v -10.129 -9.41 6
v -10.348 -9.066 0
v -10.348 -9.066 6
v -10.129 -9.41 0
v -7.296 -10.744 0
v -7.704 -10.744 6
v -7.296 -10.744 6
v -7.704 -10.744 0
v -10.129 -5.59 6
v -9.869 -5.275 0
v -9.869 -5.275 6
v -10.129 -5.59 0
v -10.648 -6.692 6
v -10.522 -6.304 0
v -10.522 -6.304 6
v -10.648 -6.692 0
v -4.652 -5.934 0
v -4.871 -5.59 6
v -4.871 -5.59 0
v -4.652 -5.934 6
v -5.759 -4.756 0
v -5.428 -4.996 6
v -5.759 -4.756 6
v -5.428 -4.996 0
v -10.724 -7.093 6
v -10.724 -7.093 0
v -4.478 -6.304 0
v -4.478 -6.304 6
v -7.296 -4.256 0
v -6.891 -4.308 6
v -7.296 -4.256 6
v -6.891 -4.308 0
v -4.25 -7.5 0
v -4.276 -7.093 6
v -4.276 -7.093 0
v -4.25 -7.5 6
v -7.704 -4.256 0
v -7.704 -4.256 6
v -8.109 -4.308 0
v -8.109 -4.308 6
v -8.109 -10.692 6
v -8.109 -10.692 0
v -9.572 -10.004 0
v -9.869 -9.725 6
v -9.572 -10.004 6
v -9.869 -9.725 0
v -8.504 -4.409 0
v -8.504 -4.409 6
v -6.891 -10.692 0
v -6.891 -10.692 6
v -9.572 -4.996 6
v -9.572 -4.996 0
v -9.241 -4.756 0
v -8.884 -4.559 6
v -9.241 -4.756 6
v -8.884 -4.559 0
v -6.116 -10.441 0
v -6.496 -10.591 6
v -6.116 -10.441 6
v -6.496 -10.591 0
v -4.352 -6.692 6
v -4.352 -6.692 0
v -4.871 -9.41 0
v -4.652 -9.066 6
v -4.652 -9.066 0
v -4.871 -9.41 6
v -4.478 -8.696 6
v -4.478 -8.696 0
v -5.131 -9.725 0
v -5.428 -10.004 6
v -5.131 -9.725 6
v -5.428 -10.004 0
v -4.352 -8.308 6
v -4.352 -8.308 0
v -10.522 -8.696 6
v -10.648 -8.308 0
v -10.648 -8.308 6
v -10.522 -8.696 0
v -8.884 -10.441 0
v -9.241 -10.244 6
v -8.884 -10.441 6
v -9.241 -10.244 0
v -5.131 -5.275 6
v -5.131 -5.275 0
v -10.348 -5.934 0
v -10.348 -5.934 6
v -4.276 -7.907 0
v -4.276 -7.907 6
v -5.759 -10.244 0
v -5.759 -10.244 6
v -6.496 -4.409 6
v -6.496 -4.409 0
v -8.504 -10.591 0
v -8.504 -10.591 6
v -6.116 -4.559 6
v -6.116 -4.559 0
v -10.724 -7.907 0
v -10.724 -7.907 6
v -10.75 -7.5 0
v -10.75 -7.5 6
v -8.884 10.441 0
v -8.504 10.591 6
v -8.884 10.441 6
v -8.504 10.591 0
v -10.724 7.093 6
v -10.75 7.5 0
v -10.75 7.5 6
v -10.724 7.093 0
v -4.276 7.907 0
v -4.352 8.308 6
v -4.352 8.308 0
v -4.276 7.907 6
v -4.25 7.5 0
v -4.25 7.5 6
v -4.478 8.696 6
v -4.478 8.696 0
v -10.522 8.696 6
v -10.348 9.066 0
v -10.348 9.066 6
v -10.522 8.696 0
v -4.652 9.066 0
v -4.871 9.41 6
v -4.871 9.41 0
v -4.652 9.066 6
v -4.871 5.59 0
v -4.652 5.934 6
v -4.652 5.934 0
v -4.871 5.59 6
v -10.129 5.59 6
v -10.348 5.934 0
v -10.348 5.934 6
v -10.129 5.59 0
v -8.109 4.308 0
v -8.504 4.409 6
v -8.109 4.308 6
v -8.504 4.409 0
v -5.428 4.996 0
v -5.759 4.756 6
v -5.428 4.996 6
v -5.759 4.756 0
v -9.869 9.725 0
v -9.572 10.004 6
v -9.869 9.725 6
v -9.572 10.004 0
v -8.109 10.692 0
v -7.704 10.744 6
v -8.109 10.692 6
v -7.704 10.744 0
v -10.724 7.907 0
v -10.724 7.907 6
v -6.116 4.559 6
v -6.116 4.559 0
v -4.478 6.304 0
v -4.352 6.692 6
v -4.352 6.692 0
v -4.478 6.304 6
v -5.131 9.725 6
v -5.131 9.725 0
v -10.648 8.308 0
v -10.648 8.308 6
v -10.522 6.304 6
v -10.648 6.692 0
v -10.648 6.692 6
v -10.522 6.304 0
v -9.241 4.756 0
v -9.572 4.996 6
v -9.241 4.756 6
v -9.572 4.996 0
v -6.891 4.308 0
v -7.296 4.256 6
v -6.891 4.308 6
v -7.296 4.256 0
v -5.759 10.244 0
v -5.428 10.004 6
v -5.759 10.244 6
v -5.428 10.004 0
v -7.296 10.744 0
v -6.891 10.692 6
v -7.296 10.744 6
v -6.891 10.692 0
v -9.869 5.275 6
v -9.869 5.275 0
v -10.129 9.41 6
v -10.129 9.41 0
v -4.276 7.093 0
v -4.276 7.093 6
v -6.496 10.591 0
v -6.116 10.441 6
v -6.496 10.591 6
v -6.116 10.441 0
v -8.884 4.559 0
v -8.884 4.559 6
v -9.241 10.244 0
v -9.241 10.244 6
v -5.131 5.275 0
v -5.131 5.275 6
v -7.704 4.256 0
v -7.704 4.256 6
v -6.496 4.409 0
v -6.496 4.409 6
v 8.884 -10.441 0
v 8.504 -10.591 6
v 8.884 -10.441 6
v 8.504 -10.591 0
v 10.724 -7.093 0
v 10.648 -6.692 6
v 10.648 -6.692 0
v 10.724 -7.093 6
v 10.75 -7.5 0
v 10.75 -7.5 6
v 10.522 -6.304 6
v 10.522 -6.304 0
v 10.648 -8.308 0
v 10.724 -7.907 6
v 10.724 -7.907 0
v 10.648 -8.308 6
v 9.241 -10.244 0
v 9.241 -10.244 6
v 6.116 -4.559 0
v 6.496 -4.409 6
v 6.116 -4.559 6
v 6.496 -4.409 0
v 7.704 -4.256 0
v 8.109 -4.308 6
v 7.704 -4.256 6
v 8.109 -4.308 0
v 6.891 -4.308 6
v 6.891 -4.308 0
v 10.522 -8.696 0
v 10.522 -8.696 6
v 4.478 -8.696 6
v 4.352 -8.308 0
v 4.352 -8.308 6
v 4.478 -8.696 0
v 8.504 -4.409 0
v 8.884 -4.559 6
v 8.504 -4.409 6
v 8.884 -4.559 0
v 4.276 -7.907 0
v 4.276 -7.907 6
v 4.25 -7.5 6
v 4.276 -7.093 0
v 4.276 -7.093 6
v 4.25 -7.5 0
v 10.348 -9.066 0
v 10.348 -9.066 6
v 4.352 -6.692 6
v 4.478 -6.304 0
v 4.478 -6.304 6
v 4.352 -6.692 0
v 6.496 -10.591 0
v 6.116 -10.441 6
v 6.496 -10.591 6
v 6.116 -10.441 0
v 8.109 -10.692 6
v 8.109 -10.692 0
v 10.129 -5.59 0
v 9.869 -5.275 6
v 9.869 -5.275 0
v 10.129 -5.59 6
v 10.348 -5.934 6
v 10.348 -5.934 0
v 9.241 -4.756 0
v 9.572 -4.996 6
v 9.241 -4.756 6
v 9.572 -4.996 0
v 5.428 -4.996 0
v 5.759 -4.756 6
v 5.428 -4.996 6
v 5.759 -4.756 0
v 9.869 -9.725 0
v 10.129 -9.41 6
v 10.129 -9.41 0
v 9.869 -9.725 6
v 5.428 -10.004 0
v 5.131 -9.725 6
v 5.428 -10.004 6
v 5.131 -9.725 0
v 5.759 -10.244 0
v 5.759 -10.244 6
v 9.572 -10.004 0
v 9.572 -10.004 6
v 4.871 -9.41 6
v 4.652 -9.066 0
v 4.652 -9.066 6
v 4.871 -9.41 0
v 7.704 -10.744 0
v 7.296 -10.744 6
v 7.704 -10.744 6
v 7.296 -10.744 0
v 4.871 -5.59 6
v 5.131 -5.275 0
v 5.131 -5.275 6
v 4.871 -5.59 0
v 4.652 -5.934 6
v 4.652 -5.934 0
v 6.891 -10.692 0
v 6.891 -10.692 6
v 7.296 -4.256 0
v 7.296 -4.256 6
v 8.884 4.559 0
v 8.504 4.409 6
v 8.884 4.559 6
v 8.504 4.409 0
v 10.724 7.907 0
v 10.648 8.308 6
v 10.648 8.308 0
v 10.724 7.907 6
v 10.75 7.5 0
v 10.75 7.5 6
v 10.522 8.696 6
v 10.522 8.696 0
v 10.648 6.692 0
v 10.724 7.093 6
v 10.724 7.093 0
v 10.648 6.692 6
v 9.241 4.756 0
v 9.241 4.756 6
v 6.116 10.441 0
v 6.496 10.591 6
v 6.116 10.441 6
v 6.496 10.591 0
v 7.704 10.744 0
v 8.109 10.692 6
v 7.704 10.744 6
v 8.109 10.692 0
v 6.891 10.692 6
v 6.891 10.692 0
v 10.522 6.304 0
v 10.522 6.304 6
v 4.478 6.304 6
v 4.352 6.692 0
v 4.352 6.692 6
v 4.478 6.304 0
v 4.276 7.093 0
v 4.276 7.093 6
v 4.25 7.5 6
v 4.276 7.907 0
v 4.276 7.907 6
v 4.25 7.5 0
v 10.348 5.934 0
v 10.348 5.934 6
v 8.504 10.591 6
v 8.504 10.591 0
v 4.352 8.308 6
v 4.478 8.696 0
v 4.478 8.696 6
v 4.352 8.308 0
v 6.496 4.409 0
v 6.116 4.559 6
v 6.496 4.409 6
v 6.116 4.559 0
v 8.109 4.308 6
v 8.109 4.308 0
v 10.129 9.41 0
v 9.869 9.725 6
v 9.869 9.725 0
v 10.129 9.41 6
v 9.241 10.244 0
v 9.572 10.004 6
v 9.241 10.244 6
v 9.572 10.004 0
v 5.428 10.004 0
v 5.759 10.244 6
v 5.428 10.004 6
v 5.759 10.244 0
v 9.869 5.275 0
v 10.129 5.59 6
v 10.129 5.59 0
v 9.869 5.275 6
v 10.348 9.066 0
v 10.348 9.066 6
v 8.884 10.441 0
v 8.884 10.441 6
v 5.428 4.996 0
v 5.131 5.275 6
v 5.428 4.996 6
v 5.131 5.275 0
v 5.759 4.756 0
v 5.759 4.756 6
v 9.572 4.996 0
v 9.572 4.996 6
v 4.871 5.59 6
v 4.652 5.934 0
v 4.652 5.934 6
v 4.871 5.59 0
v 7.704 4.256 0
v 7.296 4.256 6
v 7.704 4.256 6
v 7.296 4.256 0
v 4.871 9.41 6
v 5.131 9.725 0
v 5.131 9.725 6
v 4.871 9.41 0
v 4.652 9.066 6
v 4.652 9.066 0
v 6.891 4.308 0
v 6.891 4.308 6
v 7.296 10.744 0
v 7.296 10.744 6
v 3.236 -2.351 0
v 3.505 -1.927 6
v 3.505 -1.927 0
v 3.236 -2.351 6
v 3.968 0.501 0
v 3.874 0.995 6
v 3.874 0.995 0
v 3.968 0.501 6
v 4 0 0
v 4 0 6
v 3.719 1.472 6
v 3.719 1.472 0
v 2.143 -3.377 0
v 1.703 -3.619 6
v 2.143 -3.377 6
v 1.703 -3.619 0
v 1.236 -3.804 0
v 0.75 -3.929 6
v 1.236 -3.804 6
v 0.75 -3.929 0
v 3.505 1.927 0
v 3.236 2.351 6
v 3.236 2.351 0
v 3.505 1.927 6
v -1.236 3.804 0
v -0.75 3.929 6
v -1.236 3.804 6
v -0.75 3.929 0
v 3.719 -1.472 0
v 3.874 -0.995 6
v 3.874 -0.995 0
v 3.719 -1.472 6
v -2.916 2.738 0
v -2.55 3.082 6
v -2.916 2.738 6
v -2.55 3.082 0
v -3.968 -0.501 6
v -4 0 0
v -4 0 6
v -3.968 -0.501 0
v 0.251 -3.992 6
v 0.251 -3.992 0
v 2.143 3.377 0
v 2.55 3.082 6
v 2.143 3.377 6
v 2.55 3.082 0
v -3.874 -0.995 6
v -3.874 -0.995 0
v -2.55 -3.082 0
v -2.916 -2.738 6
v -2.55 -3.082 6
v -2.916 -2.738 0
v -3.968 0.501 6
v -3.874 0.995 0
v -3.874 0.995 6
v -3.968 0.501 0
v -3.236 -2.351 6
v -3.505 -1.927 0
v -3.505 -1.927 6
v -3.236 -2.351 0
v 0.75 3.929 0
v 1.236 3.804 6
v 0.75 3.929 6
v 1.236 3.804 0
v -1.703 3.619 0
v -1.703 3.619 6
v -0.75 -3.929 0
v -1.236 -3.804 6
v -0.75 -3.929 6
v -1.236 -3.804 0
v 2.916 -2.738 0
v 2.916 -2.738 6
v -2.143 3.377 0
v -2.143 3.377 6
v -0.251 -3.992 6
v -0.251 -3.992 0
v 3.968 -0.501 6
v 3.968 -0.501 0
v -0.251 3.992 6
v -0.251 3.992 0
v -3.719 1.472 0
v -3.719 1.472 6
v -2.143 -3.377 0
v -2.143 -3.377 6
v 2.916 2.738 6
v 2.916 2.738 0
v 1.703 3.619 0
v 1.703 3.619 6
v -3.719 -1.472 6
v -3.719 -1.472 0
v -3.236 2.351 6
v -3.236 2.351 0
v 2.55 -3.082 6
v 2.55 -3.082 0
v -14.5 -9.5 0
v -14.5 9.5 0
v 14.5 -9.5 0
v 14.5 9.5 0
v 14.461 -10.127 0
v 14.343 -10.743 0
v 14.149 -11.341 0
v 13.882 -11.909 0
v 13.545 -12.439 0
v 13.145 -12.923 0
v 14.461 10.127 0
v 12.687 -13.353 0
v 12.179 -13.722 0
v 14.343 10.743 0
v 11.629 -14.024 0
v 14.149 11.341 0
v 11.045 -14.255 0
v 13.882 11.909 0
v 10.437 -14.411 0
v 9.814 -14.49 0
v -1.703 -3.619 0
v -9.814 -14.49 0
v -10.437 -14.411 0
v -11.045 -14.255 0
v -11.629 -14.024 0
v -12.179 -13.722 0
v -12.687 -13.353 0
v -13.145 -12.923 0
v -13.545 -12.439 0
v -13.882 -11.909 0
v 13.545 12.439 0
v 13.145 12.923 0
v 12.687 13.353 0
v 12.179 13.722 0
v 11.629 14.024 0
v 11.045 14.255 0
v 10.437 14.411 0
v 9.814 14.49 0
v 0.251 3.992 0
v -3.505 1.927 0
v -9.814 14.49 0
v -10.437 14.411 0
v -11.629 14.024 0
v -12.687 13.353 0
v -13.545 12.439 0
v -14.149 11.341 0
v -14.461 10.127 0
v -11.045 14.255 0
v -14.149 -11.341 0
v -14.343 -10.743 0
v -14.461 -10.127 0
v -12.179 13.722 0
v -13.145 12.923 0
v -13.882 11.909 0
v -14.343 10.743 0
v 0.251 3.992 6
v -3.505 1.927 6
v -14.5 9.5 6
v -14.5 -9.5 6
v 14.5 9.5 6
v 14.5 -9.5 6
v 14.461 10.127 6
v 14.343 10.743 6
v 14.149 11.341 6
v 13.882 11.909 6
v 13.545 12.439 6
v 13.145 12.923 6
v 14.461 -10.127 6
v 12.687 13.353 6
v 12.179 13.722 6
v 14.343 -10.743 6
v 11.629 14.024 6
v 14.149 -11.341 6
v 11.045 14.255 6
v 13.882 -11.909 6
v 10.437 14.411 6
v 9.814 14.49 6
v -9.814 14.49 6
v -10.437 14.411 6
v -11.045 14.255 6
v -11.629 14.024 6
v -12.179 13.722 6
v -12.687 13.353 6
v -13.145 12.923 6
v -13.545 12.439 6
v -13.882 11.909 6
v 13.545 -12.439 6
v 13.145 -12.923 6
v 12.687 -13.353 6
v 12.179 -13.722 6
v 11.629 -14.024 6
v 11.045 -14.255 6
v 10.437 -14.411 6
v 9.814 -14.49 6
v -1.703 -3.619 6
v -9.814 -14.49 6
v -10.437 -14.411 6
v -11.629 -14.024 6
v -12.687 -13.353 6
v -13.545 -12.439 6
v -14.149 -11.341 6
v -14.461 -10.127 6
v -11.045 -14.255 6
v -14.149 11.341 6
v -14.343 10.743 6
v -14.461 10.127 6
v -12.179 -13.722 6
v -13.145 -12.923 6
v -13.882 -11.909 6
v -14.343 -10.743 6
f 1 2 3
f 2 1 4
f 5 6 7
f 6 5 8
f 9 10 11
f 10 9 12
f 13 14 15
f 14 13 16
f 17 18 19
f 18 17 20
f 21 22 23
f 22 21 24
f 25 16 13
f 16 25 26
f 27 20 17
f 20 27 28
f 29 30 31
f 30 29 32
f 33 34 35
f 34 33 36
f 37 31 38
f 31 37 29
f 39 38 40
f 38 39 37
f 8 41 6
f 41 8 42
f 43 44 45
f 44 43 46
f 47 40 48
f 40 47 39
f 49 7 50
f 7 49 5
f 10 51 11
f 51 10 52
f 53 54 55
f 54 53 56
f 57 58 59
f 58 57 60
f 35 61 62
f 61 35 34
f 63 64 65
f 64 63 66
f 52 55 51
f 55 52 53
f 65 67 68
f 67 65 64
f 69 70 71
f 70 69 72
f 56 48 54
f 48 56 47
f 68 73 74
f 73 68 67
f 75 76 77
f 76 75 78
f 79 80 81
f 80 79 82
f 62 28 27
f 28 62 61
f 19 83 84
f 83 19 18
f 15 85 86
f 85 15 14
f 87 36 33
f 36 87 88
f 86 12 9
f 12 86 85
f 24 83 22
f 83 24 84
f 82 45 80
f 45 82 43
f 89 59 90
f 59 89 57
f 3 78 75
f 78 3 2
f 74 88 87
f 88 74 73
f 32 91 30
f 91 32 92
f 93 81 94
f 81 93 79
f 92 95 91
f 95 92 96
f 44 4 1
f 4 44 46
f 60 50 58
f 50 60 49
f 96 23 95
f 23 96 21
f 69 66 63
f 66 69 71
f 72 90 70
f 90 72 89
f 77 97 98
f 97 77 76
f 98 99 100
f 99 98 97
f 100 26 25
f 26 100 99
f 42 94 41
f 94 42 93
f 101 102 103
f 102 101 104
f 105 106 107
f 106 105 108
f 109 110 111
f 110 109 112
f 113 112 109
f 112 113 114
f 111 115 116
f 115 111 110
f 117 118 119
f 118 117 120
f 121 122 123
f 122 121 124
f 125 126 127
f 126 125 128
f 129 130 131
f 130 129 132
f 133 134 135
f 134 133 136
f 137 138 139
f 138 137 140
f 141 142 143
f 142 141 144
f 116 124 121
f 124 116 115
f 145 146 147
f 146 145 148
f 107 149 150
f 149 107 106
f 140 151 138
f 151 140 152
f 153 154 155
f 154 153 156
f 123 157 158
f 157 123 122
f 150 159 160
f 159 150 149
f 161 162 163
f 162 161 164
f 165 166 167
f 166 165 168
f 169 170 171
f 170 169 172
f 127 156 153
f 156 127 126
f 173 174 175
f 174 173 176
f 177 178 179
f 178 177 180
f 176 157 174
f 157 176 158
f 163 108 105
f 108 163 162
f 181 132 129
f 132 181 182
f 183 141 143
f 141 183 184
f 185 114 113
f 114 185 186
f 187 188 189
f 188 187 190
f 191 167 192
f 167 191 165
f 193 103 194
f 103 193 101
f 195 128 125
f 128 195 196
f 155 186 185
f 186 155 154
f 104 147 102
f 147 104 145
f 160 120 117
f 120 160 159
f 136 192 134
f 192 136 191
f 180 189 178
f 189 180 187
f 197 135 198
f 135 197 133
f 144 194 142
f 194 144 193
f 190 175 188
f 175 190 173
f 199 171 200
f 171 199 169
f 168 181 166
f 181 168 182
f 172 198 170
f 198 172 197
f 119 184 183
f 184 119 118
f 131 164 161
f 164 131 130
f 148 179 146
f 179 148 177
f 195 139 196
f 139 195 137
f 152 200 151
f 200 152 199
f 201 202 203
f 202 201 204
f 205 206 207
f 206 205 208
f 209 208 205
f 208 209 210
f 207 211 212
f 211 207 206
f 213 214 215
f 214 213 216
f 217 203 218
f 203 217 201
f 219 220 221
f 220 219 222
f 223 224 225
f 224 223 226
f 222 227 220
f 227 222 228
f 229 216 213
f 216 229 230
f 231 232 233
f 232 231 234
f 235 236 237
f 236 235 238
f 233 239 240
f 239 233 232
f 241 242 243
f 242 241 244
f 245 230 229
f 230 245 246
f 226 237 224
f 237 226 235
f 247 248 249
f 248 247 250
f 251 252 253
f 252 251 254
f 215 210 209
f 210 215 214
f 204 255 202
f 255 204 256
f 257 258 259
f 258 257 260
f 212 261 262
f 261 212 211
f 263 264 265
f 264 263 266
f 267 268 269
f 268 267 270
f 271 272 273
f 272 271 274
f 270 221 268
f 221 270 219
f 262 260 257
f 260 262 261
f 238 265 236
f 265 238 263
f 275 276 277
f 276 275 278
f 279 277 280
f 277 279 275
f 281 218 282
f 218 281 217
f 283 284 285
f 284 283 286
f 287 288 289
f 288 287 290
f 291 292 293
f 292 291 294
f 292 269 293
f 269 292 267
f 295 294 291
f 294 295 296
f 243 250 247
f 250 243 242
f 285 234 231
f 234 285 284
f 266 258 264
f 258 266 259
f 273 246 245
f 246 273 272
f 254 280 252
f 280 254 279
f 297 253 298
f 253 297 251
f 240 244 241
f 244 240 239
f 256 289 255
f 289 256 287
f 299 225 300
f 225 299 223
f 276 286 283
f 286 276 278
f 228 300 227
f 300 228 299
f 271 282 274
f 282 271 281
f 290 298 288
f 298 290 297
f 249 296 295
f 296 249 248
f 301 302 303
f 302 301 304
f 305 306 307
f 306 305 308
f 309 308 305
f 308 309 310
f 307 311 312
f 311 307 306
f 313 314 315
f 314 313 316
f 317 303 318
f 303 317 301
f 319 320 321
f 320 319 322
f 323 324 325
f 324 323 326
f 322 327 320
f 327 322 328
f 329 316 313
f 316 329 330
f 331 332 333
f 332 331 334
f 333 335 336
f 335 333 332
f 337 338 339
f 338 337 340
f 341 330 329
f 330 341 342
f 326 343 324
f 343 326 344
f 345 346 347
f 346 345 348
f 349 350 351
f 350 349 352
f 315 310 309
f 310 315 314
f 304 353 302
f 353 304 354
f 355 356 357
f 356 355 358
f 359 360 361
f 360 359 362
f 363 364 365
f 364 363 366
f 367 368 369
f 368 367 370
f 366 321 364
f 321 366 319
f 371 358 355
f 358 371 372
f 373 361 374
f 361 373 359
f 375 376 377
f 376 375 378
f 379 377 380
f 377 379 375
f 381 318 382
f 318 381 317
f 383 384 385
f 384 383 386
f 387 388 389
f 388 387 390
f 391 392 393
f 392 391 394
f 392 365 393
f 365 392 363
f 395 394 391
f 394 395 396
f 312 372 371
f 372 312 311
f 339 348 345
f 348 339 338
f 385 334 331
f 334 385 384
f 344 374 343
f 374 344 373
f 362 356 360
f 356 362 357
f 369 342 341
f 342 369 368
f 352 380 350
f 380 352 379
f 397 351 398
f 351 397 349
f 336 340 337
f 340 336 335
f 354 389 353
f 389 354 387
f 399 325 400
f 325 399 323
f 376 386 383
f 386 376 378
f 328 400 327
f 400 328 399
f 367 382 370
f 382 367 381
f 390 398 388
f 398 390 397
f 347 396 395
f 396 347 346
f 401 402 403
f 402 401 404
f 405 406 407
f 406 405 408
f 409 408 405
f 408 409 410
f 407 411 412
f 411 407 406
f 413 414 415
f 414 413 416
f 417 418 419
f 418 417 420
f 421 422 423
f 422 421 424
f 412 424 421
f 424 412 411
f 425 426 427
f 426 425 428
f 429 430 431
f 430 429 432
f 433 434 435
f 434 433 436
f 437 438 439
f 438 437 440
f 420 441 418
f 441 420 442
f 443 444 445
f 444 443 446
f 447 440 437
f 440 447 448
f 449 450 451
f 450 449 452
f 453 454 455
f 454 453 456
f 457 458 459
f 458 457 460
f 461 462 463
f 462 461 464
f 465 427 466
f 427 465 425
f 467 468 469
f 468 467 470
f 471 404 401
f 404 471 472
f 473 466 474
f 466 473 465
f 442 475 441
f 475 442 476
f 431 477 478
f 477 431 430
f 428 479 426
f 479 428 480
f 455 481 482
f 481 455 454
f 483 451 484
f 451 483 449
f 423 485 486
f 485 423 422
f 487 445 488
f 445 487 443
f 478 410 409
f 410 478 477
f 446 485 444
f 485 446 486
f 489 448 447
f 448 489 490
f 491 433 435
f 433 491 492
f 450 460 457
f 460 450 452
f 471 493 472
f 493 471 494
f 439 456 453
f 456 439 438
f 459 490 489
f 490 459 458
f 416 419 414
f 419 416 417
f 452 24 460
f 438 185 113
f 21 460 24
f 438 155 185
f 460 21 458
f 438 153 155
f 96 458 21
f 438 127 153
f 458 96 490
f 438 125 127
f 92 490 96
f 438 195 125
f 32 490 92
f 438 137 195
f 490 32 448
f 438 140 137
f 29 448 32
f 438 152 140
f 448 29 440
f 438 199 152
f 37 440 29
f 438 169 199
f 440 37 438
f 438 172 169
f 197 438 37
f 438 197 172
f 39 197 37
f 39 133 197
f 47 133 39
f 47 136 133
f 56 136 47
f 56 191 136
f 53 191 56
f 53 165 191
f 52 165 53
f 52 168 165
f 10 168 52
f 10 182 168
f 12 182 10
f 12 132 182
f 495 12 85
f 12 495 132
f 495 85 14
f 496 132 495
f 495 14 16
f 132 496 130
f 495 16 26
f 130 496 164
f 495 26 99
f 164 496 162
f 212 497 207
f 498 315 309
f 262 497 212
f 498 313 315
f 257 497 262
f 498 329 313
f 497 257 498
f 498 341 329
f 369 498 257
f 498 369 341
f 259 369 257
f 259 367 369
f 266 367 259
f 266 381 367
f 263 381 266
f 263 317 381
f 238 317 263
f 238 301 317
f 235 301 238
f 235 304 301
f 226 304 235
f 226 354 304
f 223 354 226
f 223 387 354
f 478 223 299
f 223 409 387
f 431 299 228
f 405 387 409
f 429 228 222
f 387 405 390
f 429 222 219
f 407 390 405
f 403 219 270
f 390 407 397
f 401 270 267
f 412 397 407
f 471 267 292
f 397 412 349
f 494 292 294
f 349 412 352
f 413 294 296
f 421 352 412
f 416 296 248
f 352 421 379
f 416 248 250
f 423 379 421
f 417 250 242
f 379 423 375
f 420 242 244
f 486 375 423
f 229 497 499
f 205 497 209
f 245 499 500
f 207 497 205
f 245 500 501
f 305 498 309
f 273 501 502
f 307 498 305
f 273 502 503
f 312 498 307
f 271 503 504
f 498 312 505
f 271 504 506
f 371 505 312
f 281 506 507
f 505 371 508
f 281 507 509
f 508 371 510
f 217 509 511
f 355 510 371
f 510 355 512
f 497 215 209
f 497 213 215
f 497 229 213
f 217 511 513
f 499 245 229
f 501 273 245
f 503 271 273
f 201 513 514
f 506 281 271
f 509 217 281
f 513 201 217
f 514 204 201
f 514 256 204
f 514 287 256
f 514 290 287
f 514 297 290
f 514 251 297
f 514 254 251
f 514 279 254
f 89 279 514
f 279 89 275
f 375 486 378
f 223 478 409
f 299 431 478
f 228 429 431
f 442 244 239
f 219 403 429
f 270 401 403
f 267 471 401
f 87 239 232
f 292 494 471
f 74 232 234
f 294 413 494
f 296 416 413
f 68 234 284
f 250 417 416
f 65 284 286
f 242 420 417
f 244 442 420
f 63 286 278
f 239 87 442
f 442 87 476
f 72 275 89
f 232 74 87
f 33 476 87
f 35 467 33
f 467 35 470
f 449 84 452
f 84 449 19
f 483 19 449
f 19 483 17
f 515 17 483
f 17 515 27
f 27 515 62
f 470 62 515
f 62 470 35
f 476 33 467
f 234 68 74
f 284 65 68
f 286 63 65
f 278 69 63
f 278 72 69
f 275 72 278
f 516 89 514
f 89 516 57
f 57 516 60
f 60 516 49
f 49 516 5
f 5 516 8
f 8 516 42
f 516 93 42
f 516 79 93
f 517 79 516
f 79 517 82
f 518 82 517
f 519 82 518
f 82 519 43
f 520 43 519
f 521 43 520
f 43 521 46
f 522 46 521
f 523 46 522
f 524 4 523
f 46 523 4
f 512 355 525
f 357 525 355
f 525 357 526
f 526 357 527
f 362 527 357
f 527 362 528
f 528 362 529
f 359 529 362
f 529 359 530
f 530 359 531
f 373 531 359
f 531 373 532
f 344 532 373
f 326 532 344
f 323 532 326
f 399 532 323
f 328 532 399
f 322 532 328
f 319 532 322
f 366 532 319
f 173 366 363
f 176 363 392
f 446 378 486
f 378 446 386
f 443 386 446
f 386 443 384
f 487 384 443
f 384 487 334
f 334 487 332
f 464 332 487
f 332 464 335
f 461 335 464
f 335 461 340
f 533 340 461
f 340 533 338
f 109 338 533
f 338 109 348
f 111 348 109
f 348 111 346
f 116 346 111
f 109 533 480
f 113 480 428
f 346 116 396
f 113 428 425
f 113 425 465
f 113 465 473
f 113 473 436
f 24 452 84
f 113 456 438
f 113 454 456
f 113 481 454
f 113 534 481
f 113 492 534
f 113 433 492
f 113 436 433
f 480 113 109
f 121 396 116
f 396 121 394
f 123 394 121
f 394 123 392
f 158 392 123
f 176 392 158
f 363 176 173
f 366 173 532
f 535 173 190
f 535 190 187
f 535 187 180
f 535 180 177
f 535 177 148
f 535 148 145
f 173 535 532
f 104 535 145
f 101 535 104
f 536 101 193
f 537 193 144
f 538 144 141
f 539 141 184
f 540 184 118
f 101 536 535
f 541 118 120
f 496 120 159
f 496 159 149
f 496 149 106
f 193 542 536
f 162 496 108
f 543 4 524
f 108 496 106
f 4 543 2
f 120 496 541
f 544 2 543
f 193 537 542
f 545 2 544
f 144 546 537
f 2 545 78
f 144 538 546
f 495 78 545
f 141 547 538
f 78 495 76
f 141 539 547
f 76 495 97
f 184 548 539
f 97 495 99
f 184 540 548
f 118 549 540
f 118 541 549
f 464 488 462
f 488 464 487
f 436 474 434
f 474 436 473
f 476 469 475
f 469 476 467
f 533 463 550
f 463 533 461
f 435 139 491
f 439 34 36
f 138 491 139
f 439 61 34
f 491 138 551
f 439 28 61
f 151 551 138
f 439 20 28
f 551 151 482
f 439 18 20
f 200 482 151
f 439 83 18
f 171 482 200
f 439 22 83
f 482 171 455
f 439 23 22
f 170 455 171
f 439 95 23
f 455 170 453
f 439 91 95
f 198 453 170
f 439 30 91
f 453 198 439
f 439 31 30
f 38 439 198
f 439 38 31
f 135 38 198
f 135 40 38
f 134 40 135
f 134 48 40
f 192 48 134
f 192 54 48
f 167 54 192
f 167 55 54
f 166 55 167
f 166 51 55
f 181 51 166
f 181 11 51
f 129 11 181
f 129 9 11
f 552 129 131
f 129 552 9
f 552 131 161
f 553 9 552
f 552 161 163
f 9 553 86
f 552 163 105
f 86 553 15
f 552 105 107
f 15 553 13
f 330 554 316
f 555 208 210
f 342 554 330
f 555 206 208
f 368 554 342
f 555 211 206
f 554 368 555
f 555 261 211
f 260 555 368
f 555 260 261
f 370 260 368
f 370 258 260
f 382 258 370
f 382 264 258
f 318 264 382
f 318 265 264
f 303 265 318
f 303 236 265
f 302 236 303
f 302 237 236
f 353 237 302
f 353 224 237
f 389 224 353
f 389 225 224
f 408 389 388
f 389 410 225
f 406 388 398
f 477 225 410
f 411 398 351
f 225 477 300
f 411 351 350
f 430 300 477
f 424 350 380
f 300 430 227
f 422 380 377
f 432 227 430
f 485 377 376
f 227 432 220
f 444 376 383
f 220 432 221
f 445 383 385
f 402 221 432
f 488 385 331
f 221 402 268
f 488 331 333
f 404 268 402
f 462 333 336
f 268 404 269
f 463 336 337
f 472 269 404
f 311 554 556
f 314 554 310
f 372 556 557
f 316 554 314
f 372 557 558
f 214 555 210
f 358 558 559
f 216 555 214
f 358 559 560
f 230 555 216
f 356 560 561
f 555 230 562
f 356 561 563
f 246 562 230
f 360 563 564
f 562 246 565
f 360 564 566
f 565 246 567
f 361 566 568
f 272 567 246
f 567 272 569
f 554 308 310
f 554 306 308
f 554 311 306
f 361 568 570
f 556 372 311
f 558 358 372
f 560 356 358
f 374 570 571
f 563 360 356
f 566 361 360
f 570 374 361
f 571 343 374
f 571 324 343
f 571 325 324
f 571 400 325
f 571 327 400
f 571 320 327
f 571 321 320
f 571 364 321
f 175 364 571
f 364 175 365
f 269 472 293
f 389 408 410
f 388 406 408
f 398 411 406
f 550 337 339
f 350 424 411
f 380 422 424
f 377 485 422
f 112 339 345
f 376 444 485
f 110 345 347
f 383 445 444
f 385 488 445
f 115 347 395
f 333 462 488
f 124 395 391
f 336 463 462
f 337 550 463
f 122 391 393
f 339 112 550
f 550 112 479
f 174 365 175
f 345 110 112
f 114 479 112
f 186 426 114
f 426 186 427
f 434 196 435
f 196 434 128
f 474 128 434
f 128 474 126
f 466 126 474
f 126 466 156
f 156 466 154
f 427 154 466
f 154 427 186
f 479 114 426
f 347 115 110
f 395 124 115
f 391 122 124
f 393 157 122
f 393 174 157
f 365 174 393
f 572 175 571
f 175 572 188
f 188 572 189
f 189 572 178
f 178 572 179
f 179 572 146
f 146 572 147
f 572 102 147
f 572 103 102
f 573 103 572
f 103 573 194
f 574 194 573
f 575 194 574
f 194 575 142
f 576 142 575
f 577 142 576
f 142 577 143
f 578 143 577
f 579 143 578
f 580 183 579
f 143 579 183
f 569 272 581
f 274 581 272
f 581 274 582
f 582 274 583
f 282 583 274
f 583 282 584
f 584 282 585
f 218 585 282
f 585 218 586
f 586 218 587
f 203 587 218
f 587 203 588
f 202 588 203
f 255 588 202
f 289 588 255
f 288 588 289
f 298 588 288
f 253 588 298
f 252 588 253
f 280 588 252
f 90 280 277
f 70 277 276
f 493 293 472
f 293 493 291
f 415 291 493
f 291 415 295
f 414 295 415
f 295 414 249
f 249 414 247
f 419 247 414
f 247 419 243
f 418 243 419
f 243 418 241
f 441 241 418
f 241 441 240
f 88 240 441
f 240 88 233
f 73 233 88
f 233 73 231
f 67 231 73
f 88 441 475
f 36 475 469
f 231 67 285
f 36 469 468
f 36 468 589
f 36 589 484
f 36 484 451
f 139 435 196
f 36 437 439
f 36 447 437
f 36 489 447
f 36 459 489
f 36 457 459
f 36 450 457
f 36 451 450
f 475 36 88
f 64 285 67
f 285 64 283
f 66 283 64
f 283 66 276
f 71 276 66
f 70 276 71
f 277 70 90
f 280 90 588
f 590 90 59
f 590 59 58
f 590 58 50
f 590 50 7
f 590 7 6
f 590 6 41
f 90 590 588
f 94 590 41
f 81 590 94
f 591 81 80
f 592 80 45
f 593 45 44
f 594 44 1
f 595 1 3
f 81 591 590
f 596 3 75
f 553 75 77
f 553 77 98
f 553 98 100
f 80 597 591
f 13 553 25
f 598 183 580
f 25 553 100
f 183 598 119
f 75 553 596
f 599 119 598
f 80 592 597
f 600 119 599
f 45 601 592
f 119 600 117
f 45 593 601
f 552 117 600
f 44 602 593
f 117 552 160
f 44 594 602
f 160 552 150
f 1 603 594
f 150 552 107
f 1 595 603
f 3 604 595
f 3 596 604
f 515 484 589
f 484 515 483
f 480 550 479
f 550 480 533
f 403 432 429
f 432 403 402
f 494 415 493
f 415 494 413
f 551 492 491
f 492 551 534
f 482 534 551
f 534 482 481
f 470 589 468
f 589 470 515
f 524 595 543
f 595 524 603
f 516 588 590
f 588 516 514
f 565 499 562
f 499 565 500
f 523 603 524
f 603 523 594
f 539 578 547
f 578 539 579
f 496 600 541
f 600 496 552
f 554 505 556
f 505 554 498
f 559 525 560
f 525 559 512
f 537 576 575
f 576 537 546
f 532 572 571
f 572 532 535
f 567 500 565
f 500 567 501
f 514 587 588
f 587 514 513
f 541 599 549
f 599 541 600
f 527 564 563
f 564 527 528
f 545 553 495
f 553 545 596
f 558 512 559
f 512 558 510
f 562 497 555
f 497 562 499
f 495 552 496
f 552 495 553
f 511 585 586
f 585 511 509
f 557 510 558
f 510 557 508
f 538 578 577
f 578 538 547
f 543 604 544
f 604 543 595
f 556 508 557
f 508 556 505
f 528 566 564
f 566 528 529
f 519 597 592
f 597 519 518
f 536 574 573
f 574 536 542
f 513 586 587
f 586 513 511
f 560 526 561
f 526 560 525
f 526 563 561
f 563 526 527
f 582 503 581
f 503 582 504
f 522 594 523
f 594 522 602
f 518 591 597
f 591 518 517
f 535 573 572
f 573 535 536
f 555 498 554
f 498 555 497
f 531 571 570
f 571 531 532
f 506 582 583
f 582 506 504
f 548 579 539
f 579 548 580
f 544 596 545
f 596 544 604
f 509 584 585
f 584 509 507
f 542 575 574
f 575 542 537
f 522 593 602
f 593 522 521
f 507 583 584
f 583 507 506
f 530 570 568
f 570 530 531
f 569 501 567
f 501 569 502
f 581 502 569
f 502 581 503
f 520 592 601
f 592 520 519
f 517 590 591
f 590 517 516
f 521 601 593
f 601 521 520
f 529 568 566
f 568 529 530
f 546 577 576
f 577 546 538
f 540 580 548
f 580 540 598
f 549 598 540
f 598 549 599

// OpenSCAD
$fn = 50;


difference() {
	union() {
		hull() {
			translate(v = [-9.5000000000, 9.5000000000, 0]) {
				cylinder(h = 6, r = 5);
			}
			translate(v = [9.5000000000, 9.5000000000, 0]) {
				cylinder(h = 6, r = 5);
			}
			translate(v = [-9.5000000000, -9.5000000000, 0]) {
				cylinder(h = 6, r = 5);
			}
			translate(v = [9.5000000000, -9.5000000000, 0]) {
				cylinder(h = 6, r = 5);
			}
		}
	}
	union() {
		#translate(v = [-7.5000000000, -7.5000000000, -100.0000000000]) {
			cylinder(h = 200, r = 3.2500000000);
		}
		#translate(v = [-7.5000000000, 7.5000000000, -100.0000000000]) {
			cylinder(h = 200, r = 3.2500000000);
		}
		#translate(v = [7.5000000000, -7.5000000000, -100.0000000000]) {
			cylinder(h = 200, r = 3.2500000000);
		}
		#translate(v = [7.5000000000, 7.5000000000, -100.0000000000]) {
			cylinder(h = 200, r = 3.2500000000);
		}
		#cylinder(h = 6, r = 4.0000000000);
	}
}
